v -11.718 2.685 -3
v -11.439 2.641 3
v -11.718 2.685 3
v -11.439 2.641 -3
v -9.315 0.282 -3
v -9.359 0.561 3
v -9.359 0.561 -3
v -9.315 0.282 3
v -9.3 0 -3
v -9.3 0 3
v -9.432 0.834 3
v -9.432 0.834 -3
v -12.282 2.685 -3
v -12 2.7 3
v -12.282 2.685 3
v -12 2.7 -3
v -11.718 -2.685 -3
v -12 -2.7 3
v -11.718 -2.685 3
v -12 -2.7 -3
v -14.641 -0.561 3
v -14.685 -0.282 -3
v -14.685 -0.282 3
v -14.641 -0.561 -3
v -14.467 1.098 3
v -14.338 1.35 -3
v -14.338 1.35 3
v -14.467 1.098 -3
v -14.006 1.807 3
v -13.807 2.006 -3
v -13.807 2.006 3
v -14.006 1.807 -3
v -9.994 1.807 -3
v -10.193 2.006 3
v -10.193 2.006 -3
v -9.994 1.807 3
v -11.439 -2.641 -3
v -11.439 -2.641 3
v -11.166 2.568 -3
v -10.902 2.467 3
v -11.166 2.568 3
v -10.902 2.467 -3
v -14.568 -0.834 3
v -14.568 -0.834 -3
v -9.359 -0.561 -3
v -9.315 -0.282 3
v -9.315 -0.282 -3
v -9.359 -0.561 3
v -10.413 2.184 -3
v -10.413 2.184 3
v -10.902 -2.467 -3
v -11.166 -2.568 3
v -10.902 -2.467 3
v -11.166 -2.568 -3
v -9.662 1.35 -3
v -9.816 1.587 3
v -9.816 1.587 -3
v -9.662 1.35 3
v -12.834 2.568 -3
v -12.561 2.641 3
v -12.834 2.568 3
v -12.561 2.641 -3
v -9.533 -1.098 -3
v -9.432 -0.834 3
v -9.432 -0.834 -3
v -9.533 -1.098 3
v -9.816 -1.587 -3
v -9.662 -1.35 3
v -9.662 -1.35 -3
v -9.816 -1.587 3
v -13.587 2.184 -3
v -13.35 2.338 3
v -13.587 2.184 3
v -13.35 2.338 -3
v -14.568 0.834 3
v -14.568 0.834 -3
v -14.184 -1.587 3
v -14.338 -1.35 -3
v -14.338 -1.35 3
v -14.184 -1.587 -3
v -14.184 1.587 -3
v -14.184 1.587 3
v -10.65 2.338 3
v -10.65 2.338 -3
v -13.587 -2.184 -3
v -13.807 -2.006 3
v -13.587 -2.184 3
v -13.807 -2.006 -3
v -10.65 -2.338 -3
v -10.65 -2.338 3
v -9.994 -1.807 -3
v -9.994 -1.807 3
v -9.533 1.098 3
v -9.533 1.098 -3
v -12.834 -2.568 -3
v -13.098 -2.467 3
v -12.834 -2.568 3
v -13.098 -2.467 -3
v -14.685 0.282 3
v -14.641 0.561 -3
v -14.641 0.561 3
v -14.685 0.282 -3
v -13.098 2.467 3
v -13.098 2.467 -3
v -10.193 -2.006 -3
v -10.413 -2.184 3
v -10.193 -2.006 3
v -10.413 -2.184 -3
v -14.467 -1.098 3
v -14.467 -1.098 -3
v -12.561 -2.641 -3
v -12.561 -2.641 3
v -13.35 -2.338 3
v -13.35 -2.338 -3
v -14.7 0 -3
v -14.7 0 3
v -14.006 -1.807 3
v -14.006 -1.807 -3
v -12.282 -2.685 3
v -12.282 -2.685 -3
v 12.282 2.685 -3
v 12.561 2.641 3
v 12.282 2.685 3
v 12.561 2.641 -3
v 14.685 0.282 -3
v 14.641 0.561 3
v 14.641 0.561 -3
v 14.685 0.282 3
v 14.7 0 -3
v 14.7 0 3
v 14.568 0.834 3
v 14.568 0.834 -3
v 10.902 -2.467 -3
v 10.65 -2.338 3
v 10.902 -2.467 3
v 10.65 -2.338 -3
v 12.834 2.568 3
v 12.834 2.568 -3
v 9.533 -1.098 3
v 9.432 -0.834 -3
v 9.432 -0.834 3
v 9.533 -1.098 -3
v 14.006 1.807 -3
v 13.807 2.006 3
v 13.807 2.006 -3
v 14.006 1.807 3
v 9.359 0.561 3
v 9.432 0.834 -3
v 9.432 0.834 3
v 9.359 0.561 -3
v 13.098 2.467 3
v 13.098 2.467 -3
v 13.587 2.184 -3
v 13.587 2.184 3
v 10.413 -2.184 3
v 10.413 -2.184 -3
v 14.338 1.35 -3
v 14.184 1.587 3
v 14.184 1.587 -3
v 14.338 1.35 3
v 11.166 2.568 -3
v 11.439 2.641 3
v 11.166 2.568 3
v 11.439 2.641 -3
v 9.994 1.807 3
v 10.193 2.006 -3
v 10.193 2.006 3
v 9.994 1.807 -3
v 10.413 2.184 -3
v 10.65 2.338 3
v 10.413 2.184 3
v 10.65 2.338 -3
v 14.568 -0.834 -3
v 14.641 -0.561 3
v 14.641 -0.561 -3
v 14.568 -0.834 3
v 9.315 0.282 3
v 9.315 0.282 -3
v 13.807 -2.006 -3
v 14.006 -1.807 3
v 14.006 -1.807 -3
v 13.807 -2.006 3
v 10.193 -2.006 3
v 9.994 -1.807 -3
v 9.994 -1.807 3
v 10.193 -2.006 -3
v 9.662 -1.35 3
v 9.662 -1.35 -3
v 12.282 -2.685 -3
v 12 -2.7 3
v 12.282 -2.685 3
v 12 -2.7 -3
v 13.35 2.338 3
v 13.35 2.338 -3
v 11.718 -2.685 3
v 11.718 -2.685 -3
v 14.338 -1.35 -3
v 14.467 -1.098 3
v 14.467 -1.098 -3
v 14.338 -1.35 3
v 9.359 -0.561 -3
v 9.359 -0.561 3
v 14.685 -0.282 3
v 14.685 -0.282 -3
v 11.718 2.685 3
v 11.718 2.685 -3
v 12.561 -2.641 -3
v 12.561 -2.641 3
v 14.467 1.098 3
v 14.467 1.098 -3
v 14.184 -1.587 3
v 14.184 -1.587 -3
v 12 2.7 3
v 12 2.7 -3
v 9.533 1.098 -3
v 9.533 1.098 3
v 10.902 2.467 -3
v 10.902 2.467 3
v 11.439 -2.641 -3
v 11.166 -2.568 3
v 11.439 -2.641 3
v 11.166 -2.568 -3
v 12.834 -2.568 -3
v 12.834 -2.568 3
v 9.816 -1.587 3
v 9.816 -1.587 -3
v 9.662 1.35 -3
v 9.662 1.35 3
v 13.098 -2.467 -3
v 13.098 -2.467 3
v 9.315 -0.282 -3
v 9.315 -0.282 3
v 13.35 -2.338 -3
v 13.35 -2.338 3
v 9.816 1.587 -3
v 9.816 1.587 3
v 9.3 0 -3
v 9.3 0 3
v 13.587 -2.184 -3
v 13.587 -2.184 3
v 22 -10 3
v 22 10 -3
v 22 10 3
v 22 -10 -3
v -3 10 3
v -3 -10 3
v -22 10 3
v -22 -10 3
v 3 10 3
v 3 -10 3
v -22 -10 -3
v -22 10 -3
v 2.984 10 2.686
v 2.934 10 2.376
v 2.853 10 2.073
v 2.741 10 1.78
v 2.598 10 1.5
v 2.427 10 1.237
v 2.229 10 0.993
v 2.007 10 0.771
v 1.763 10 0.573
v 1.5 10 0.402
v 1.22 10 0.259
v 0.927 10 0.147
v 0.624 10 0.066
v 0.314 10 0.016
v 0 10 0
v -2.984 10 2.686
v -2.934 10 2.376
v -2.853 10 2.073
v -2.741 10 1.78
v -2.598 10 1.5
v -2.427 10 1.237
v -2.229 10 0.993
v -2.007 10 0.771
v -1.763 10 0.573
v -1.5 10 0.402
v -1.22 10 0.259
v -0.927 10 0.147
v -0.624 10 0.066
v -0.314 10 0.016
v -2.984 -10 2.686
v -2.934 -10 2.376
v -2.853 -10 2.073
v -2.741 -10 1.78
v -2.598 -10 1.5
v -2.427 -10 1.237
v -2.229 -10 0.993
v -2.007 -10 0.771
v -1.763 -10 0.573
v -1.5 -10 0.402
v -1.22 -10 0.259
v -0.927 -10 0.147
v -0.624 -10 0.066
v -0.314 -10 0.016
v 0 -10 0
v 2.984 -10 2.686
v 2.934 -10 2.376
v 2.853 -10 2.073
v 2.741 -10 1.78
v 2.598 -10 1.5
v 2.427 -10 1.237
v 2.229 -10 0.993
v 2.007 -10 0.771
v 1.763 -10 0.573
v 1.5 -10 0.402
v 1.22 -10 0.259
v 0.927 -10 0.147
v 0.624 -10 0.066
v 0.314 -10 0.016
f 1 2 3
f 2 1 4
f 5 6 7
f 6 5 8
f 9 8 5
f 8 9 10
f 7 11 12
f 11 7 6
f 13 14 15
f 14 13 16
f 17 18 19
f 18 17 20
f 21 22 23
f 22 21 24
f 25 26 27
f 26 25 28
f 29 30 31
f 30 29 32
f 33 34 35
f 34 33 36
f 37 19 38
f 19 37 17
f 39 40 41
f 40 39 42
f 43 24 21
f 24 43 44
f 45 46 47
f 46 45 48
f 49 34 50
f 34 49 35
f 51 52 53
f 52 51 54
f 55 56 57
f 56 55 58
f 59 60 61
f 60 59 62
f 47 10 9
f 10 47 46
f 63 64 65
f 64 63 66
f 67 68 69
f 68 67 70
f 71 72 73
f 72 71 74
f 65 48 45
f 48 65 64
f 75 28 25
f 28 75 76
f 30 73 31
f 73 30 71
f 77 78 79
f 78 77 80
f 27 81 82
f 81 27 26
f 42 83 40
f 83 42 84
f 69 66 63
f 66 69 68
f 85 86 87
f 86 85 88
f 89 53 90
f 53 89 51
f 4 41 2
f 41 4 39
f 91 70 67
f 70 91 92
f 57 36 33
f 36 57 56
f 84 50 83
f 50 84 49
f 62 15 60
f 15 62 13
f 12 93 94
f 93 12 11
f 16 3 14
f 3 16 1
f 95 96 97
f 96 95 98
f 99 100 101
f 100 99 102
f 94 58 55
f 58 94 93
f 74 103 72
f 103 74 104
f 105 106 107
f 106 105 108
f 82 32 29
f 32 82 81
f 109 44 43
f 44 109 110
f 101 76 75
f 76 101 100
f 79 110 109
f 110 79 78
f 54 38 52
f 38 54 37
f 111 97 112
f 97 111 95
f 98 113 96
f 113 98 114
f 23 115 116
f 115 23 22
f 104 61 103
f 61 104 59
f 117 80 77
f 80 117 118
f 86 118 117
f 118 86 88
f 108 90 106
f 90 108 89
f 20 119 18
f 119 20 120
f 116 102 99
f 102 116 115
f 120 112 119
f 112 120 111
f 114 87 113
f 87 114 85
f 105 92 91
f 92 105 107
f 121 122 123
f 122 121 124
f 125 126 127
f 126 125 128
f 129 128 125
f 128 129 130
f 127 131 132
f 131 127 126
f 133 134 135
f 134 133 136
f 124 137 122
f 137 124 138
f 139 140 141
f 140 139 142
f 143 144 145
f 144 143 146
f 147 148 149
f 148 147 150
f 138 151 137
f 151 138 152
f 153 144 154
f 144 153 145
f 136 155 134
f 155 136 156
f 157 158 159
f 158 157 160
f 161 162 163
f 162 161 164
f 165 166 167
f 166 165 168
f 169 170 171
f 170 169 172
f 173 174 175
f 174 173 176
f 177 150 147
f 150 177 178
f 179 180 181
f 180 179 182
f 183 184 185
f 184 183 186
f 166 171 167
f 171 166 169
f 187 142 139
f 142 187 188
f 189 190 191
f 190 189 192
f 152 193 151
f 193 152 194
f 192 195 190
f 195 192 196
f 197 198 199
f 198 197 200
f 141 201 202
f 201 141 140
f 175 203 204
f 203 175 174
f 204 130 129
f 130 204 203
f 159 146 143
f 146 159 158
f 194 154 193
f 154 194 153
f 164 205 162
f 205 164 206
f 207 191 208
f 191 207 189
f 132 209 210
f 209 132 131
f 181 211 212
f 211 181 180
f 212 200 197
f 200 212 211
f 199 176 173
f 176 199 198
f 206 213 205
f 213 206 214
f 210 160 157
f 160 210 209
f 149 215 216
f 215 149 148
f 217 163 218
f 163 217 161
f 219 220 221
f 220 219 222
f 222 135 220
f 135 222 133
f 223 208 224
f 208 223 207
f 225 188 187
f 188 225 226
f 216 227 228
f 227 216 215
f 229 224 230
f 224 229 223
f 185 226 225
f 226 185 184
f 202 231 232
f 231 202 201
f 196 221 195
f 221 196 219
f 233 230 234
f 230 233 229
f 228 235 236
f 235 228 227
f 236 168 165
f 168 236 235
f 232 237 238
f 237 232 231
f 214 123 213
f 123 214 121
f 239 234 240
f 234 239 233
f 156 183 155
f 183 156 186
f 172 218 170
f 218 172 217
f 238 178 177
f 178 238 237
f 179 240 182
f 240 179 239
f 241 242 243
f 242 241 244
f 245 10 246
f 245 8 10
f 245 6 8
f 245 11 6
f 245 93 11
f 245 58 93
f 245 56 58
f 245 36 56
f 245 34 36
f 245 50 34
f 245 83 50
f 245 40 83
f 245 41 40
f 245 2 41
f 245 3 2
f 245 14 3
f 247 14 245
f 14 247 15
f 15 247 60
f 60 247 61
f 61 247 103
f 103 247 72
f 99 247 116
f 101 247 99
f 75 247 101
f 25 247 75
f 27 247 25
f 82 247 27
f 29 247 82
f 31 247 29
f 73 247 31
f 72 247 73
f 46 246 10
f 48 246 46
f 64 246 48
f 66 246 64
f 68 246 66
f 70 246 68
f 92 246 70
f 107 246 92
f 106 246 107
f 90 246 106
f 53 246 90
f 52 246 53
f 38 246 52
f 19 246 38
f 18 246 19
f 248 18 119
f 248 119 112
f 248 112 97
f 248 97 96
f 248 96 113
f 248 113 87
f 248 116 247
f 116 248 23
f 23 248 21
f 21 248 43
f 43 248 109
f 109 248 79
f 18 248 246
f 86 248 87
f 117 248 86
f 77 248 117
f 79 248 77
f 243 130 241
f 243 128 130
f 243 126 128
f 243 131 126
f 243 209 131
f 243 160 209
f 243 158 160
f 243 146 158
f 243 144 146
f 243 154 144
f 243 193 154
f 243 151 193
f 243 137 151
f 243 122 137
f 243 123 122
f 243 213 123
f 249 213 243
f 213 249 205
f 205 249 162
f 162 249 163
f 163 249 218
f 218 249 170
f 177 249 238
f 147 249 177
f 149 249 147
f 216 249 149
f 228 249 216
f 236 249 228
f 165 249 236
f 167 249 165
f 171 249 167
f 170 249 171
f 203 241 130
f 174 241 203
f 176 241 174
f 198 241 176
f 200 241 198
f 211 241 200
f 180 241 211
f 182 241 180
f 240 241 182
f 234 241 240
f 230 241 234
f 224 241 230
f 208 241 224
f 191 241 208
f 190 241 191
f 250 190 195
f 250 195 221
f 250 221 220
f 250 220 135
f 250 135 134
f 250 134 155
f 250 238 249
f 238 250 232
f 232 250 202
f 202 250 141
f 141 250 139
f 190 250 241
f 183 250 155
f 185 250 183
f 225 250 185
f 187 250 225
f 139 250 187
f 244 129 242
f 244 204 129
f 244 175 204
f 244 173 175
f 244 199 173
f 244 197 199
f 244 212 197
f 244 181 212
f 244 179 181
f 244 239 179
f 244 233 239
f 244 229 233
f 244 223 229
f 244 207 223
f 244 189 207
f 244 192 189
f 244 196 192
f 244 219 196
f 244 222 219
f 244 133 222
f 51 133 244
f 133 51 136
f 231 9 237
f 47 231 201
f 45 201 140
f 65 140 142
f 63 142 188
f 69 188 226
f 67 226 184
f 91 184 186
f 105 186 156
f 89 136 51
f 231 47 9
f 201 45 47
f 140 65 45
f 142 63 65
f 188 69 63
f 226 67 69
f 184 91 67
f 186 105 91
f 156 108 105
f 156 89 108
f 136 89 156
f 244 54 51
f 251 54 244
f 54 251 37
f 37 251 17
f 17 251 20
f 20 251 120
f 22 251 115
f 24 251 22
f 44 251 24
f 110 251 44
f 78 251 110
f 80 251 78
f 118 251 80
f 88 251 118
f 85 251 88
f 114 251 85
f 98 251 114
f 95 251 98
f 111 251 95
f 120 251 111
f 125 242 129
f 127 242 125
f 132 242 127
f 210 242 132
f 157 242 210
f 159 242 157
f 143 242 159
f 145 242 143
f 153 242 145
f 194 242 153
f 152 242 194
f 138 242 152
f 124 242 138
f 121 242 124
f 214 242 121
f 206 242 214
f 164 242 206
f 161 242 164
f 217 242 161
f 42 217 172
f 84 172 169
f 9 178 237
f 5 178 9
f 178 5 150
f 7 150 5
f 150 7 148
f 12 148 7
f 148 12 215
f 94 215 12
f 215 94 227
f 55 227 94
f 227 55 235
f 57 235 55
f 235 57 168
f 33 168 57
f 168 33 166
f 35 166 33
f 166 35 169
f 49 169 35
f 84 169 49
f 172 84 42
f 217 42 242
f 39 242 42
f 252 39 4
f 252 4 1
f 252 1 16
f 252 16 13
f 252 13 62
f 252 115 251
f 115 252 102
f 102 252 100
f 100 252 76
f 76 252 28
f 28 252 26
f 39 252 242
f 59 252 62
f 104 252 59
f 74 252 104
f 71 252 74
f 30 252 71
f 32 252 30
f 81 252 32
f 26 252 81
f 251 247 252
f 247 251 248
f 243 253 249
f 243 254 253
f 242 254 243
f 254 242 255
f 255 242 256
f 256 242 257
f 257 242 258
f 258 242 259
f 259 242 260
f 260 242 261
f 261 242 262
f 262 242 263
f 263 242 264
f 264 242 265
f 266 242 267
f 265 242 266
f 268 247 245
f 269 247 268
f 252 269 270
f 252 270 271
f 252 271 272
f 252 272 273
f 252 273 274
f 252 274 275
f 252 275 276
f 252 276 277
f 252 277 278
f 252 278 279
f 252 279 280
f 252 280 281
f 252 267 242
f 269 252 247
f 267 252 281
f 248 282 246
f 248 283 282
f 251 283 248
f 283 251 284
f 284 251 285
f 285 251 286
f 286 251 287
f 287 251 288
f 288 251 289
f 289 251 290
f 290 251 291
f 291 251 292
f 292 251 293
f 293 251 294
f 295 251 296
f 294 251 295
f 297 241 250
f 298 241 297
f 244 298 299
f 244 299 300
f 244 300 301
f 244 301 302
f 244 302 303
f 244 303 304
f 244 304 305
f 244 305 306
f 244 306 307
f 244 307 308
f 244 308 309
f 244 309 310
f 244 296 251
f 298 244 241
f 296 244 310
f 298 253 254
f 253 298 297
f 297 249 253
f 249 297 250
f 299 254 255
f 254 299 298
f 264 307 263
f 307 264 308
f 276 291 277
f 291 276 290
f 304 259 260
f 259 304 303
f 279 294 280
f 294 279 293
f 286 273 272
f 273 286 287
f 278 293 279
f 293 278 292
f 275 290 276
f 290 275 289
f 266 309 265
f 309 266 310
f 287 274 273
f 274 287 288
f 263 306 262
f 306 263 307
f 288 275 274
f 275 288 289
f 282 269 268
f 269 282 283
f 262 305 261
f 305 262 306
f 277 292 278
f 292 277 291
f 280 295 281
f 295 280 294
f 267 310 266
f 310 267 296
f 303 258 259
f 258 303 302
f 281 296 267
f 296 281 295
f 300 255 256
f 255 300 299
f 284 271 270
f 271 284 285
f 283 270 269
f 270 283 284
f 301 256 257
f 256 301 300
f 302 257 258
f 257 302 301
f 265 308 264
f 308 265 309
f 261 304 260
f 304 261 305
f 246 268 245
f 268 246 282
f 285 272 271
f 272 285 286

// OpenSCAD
// Saddle clamp base for round tube.
$fn = 60;
eps = 0.02;
pipe_d = 6;
base_l = 44;
base_w = 20;
base_t = 6;
difference() {
    cube([base_l,base_w,base_t],center=true);
    translate([0,-base_w/2-eps,base_t/2]) rotate([-90,0,0]) cylinder(d=pipe_d,h=base_w+2*eps);
    for (x=[-base_l/2+10,base_l/2-10]) translate([x,0,-base_t/2-eps]) cylinder(d=5.4,h=base_t+2*eps);
}
